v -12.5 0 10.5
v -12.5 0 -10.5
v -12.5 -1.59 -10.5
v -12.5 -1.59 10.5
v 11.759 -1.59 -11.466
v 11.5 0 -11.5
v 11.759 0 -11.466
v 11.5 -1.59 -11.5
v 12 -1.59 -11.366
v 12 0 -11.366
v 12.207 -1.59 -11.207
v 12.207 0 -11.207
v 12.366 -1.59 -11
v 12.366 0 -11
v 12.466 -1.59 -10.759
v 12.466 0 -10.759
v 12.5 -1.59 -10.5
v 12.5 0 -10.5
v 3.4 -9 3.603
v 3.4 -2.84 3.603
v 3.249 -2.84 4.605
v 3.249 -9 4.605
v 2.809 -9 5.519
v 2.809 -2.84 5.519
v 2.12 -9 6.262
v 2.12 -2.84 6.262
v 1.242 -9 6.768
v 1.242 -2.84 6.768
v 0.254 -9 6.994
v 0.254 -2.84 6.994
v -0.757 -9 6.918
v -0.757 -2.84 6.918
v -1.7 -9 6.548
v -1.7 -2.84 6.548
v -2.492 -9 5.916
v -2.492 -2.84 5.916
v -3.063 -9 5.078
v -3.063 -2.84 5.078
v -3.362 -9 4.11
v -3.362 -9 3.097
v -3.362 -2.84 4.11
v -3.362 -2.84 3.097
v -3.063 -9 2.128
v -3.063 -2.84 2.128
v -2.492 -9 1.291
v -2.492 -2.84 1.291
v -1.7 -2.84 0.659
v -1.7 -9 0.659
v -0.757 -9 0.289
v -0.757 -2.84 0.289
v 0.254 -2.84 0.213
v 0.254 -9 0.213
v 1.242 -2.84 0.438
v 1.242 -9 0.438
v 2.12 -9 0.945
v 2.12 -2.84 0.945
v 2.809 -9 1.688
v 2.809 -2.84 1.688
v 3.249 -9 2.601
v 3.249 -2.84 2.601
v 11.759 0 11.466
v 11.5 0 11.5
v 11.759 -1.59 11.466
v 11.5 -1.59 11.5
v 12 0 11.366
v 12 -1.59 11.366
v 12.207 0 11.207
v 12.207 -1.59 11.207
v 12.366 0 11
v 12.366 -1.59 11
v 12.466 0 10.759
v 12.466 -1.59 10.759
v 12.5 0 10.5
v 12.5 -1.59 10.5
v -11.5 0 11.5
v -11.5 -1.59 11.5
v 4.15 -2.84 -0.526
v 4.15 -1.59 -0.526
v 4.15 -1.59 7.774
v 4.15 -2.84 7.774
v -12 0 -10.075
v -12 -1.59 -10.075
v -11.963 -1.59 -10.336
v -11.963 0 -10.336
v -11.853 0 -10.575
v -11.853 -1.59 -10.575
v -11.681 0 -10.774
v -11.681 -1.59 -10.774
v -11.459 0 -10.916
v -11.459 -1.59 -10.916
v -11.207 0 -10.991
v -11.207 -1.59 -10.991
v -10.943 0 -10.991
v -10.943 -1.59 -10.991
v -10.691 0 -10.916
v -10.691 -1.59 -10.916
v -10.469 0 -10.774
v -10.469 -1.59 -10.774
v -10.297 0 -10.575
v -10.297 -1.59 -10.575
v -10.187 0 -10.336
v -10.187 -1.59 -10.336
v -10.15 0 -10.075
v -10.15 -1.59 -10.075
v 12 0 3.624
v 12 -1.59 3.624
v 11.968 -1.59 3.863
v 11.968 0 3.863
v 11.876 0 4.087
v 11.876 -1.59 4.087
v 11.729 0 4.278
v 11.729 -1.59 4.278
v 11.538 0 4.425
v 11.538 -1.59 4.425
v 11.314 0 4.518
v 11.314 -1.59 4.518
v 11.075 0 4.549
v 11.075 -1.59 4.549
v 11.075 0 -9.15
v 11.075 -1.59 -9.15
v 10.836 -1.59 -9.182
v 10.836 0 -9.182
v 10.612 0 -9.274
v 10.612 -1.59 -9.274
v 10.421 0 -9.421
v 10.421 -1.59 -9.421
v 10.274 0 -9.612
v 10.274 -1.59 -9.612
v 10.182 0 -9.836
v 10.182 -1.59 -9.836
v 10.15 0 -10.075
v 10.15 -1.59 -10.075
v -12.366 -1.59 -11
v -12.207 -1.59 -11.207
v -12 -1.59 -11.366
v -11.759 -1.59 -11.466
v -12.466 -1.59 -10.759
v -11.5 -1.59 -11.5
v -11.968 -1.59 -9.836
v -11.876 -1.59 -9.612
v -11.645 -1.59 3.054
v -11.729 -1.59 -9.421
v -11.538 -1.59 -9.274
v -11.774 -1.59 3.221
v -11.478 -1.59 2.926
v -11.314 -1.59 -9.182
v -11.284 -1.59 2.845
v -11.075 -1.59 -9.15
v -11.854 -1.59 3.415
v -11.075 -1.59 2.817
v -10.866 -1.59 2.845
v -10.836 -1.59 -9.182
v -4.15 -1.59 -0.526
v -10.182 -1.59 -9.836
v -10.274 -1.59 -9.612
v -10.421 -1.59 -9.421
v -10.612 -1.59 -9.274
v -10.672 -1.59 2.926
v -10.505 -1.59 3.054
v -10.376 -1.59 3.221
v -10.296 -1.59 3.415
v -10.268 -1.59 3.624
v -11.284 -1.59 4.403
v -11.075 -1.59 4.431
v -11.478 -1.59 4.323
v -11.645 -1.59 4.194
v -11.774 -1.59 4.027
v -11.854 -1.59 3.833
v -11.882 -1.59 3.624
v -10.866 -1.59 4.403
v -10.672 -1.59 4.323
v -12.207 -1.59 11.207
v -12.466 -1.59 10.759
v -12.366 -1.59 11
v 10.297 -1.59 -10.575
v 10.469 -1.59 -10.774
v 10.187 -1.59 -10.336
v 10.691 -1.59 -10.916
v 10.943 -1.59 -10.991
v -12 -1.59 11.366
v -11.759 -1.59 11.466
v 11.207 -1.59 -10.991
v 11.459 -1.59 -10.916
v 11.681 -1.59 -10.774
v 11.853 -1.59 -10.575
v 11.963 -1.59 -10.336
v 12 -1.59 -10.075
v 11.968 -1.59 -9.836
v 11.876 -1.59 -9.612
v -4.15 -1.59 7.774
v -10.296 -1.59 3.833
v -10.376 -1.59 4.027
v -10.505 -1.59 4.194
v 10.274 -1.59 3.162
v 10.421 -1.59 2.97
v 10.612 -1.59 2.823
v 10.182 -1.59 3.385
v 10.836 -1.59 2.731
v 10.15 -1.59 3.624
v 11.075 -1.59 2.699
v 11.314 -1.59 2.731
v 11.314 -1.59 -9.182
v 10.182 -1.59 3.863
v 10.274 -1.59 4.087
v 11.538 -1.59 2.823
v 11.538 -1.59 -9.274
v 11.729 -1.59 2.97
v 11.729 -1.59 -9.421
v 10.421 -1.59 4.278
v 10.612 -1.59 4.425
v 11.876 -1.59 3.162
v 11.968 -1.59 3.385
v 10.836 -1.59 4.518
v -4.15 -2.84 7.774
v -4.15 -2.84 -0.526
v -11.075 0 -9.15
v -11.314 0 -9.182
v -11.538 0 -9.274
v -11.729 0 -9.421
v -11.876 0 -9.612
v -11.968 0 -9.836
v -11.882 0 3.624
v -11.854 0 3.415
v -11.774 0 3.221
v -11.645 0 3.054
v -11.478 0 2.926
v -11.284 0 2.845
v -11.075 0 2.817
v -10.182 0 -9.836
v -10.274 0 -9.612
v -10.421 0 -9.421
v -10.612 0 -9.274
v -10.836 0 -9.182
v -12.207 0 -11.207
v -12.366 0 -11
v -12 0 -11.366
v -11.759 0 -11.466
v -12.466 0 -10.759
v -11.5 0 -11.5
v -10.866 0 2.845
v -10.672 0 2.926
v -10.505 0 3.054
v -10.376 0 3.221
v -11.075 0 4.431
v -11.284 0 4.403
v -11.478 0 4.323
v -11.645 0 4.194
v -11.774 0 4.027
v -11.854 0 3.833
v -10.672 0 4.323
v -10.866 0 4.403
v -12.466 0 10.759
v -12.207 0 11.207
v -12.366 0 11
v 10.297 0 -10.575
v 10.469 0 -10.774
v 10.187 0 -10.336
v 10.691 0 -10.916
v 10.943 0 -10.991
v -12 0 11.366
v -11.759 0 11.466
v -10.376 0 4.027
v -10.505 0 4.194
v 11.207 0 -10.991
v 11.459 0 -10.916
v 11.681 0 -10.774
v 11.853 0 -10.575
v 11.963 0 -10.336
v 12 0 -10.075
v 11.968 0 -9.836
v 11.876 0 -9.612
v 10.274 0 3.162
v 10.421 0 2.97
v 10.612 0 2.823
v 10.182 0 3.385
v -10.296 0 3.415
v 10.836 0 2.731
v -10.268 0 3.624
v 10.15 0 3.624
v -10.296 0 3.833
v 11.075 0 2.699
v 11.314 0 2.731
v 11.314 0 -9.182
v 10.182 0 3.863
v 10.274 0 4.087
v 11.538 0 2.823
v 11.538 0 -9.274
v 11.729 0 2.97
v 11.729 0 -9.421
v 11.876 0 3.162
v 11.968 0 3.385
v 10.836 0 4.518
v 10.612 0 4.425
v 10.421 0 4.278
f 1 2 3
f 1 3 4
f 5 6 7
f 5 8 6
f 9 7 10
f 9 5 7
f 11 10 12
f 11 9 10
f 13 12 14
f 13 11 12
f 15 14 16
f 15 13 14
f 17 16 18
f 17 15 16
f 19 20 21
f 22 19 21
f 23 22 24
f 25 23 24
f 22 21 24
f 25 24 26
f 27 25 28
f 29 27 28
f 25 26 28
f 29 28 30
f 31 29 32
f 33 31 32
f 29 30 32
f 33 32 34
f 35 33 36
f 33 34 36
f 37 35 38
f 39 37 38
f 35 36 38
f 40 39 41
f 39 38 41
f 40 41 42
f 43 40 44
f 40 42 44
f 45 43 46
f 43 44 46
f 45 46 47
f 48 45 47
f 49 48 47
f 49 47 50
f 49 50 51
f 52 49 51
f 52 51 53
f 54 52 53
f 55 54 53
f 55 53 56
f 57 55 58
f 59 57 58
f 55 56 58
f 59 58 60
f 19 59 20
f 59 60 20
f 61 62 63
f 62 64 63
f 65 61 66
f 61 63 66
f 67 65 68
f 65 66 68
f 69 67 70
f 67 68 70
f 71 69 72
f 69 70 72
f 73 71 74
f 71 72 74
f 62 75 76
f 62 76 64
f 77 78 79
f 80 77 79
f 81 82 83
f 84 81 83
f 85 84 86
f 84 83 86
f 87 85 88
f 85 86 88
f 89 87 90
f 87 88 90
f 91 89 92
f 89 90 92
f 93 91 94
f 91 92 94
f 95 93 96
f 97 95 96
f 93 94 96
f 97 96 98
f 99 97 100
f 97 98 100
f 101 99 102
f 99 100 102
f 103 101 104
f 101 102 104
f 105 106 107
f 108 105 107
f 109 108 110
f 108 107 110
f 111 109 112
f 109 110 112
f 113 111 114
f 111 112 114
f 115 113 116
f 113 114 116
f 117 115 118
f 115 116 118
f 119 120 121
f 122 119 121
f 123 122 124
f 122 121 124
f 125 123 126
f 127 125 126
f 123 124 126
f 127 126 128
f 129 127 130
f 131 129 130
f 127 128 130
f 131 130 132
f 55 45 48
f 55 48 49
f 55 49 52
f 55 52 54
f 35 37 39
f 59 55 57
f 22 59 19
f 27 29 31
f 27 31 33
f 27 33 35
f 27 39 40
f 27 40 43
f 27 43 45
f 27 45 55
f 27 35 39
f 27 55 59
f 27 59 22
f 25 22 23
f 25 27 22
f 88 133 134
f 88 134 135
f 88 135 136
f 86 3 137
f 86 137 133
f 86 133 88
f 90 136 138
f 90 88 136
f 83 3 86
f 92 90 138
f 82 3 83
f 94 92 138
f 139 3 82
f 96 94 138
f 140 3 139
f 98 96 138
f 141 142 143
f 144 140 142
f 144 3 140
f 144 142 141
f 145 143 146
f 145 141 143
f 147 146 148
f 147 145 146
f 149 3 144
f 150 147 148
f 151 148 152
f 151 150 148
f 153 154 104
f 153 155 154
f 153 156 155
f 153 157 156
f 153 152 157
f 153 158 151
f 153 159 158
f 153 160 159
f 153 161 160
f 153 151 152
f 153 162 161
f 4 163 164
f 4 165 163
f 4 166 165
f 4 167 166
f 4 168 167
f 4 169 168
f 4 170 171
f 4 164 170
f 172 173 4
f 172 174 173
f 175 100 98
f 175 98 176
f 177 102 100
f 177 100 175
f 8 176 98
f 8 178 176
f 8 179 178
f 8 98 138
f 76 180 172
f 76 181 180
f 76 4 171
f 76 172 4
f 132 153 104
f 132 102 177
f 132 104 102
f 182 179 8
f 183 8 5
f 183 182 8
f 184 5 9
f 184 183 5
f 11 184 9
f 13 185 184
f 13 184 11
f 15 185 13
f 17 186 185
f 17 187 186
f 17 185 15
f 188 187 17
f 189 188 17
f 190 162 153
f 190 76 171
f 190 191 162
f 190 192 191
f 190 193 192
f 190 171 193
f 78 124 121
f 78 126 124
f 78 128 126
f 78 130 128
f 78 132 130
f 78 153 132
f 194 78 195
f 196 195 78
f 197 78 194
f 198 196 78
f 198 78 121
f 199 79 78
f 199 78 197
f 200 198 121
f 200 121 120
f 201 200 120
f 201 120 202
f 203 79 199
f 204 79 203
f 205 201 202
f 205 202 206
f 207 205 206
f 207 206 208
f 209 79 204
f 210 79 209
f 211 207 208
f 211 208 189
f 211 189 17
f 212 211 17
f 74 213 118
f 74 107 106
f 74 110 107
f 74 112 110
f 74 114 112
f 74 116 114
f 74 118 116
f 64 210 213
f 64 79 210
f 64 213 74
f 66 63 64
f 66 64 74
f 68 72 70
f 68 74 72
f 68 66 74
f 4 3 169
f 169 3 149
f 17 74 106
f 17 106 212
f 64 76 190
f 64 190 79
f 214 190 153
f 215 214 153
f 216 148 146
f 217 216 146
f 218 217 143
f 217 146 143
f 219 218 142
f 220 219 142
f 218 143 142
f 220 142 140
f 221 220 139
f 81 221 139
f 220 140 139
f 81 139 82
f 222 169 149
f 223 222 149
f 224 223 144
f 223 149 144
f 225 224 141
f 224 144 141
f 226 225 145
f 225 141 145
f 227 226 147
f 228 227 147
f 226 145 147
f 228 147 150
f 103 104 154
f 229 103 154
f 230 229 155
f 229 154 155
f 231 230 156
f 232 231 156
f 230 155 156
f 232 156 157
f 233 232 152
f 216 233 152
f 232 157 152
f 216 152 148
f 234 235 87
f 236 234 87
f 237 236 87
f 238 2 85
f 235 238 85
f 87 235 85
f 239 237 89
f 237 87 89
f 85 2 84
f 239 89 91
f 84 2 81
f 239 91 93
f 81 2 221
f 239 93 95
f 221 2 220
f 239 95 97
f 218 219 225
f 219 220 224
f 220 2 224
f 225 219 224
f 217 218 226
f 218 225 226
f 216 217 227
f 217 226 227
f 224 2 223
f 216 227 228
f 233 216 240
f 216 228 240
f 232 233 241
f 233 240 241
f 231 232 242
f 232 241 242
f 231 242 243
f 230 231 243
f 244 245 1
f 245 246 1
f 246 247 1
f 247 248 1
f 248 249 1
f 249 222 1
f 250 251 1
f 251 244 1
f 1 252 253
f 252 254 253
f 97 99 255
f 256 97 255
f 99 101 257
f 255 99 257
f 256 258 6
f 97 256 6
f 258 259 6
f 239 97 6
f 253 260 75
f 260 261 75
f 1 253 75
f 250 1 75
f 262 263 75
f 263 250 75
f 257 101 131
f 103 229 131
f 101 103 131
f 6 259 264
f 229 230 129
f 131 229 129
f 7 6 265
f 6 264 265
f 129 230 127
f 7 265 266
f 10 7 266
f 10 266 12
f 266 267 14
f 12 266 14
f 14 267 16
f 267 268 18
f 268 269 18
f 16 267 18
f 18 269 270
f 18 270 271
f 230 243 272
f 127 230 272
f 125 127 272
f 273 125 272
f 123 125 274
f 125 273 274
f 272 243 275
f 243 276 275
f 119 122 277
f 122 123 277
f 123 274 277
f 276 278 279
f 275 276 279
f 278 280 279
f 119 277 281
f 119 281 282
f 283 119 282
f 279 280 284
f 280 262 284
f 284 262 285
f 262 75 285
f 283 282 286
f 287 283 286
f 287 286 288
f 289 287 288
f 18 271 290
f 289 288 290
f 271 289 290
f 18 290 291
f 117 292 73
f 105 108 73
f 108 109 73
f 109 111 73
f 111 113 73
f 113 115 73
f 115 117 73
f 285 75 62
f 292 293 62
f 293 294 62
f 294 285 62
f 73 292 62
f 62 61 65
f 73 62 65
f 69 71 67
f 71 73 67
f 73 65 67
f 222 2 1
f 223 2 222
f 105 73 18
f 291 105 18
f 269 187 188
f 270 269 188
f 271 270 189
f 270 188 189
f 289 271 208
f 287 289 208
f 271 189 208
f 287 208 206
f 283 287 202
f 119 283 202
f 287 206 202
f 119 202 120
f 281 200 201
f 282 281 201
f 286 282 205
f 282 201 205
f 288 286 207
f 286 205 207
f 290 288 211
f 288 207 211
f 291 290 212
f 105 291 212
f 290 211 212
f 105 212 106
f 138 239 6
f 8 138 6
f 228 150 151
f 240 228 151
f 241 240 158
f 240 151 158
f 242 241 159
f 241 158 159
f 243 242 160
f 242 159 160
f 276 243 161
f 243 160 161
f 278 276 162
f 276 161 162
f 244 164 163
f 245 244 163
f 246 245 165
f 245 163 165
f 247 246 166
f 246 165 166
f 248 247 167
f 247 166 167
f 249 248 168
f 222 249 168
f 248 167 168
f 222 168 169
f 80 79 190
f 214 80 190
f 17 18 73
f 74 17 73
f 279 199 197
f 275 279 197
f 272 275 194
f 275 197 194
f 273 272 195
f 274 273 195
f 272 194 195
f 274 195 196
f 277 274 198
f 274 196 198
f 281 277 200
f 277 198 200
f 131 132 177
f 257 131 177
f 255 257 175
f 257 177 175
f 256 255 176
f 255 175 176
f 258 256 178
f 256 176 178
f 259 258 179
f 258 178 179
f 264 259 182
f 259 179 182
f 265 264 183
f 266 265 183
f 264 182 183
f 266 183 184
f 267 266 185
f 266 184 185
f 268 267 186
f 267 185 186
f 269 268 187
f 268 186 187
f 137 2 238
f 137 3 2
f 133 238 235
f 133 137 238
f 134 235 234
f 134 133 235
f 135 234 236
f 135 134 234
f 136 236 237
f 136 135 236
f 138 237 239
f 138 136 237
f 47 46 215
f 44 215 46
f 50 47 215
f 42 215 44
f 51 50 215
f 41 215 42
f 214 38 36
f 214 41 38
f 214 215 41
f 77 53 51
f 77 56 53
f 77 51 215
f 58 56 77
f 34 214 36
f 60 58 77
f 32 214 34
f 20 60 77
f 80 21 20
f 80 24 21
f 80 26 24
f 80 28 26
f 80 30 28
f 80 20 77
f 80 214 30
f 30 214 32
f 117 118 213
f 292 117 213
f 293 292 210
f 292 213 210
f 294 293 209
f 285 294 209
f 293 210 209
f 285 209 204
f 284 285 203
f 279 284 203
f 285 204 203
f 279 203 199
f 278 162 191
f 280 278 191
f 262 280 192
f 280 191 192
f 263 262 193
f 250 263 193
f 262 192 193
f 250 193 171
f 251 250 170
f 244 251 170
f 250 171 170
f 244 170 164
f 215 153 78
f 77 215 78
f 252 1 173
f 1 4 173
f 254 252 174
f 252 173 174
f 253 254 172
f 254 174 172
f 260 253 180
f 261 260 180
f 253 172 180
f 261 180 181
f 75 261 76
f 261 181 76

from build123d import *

# Parameters (mm, degrees)
F0_W     = 25
F0_H     = 23
F1_DEPTH = 1.59
F3_DEPTH = 25
F2_W     = 4.15
F2_H     = 4.15
F2_H_2   = 3.6240464542
F2_H_3   = 0.5259535458
F4_DEPTH = 1.25
F5_R     = 3.4
F6_DEPTH = 6.16
F7_R     = 1


with BuildPart() as f1:
    # F0 (on Front) → F1 (new body)
    with BuildSketch(Plane.XZ):
        Rectangle(F0_W, F0_H)
    extrude(amount=F1_DEPTH)

    # F2 (on face) → F3 (cut)
    with BuildSketch(Plane.XZ.offset(1.59)):
        with BuildLine():
            Line((-10.2684276358, 3.6240464542), (-11.075, 3.6240464542))
            Line((-11.075, 3.6240464542), (-11.075, 2.81747409))
            ThreePointArc((-11.075, 2.81747409), (-10.5046672118, 3.053713666), (-10.2684276358, 3.6240464542))
        make_face()
        with BuildLine():
            ThreePointArc((-10.2684276358, 3.6240464542), (-10.5046672118, 4.1943792424), (-11.075, 4.4306188184))
            Line((-11.075, 4.4306188184), (-11.075, 3.6240464542))
            Line((-11.075, 3.6240464542), (-10.2684276358, 3.6240464542))
        make_face()
        with BuildLine():
            Line((-11.075, 3.6240464542), (-11.075, 4.4306188184))
            ThreePointArc((-11.075, 4.4306188184), (-11.6453327882, 4.1943792424), (-11.8815723642, 3.6240464542))
            Line((-11.8815723642, 3.6240464542), (-11.075, 3.6240464542))
        make_face()
        with BuildLine():
            Line((-11.075, 2.81747409), (-11.075, 3.6240464542))
            Line((-11.075, 3.6240464542), (-11.8815723642, 3.6240464542))
            ThreePointArc((-11.8815723642, 3.6240464542), (-11.6453327882, 3.053713666), (-11.075, 2.81747409))
        make_face()
        with BuildLine():
            Line((-11.075, -10.075), (-11.075, -9.15))
            ThreePointArc((-11.075, -9.15), (-11.7290737726, -9.4209262274), (-12, -10.075))
            Line((-12, -10.075), (-11.075, -10.075))
        make_face()
        with BuildLine():
            Line((-11.075, -10.075), (-10.15, -10.075))
            ThreePointArc((-10.15, -10.075), (-10.4209262274, -9.4209262274), (-11.075, -9.15))
            Line((-11.075, -9.15), (-11.075, -10.075))
        make_face()
        with BuildLine():
            ThreePointArc((-12, -10.075), (-11.075, -11), (-10.15, -10.075))
            Line((-10.15, -10.075), (-11.075, -10.075))
            Line((-11.075, -10.075), (-12, -10.075))
        make_face()
        with BuildLine():
            Line((11.075, -10.075), (10.15, -10.075))
            ThreePointArc((10.15, -10.075), (11.075, -11), (12, -10.075))
            Line((12, -10.075), (11.075, -10.075))
        make_face()
        with BuildLine():
            ThreePointArc((12, -10.075), (11.7290737726, -9.4209262274), (11.075, -9.15))
            Line((11.075, -9.15), (11.075, -10.075))
            Line((11.075, -10.075), (12, -10.075))
        make_face()
        with BuildLine():
            ThreePointArc((11.075, -9.15), (10.4209262274, -9.4209262274), (10.15, -10.075))
            Line((10.15, -10.075), (11.075, -10.075))
            Line((11.075, -10.075), (11.075, -9.15))
        make_face()
        with BuildLine():
            Line((11.075, 2.6990464542), (11.075, 3.6240464542))
            Line((11.075, 3.6240464542), (10.15, 3.6240464542))
            ThreePointArc((10.15, 3.6240464542), (10.4209262274, 2.9699726816), (11.075, 2.6990464542))
        make_face()
        with BuildLine():
            ThreePointArc((12, 3.6240464542), (11.7290737726, 4.2781202268), (11.075, 4.5490464542))
            Line((11.075, 4.5490464542), (11.075, 3.6240464542))
            Line((11.075, 3.6240464542), (12, 3.6240464542))
        make_face()
        with BuildLine():
            Line((12, 3.6240464542), (11.075, 3.6240464542))
            Line((11.075, 3.6240464542), (11.075, 2.6990464542))
            ThreePointArc((11.075, 2.6990464542), (11.7290737726, 2.9699726816), (12, 3.6240464542))
        make_face()
        with BuildLine():
            Line((11.075, 3.6240464542), (11.075, 4.5490464542))
            ThreePointArc((11.075, 4.5490464542), (10.4209262274, 4.2781202268), (10.15, 3.6240464542))
            Line((10.15, 3.6240464542), (11.075, 3.6240464542))
        make_face()
    extrude(amount=-F3_DEPTH, mode=Mode.SUBTRACT)

    # F2 (on face) → F4 (join)
    with BuildSketch(Plane.XZ.offset(1.59)):
        with Locations((-2.075, 5.6990464542)):
            Rectangle(F2_W, F2_H)
        with Locations((2.075, 5.6990464542)):
            Rectangle(F2_W, F2_H)
        with Locations((2.075, 1.8120232271)):
            Rectangle(F2_W, F2_H_2)
        with Locations((-2.075, 1.8120232271)):
            Rectangle(F2_W, F2_H_2)
        with Locations((-2.075, -0.2629767729)):
            Rectangle(F2_W, F2_H_3)
        with Locations((2.075, -0.2629767729)):
            Rectangle(F2_W, F2_H_3)
    extrude(amount=F4_DEPTH)

    # F5 (on face) → F6 (join)
    with BuildSketch(Plane.XZ.offset(2.84)):
        with Locations((0, 3.603294285)):
            Circle(F5_R)
    extrude(amount=F6_DEPTH)

    # F7
    f7_edges = [f1.edges().sort_by_distance(p)[0] for p in [
        (-12.5, -0.795, -11.5),
        (-12.5, -0.795, 11.5),
        (12.5, -0.795, -11.5),
        (12.5, -0.795, 11.5),
    ]]
    fillet(f7_edges, radius=F7_R)


solid = f1.part
